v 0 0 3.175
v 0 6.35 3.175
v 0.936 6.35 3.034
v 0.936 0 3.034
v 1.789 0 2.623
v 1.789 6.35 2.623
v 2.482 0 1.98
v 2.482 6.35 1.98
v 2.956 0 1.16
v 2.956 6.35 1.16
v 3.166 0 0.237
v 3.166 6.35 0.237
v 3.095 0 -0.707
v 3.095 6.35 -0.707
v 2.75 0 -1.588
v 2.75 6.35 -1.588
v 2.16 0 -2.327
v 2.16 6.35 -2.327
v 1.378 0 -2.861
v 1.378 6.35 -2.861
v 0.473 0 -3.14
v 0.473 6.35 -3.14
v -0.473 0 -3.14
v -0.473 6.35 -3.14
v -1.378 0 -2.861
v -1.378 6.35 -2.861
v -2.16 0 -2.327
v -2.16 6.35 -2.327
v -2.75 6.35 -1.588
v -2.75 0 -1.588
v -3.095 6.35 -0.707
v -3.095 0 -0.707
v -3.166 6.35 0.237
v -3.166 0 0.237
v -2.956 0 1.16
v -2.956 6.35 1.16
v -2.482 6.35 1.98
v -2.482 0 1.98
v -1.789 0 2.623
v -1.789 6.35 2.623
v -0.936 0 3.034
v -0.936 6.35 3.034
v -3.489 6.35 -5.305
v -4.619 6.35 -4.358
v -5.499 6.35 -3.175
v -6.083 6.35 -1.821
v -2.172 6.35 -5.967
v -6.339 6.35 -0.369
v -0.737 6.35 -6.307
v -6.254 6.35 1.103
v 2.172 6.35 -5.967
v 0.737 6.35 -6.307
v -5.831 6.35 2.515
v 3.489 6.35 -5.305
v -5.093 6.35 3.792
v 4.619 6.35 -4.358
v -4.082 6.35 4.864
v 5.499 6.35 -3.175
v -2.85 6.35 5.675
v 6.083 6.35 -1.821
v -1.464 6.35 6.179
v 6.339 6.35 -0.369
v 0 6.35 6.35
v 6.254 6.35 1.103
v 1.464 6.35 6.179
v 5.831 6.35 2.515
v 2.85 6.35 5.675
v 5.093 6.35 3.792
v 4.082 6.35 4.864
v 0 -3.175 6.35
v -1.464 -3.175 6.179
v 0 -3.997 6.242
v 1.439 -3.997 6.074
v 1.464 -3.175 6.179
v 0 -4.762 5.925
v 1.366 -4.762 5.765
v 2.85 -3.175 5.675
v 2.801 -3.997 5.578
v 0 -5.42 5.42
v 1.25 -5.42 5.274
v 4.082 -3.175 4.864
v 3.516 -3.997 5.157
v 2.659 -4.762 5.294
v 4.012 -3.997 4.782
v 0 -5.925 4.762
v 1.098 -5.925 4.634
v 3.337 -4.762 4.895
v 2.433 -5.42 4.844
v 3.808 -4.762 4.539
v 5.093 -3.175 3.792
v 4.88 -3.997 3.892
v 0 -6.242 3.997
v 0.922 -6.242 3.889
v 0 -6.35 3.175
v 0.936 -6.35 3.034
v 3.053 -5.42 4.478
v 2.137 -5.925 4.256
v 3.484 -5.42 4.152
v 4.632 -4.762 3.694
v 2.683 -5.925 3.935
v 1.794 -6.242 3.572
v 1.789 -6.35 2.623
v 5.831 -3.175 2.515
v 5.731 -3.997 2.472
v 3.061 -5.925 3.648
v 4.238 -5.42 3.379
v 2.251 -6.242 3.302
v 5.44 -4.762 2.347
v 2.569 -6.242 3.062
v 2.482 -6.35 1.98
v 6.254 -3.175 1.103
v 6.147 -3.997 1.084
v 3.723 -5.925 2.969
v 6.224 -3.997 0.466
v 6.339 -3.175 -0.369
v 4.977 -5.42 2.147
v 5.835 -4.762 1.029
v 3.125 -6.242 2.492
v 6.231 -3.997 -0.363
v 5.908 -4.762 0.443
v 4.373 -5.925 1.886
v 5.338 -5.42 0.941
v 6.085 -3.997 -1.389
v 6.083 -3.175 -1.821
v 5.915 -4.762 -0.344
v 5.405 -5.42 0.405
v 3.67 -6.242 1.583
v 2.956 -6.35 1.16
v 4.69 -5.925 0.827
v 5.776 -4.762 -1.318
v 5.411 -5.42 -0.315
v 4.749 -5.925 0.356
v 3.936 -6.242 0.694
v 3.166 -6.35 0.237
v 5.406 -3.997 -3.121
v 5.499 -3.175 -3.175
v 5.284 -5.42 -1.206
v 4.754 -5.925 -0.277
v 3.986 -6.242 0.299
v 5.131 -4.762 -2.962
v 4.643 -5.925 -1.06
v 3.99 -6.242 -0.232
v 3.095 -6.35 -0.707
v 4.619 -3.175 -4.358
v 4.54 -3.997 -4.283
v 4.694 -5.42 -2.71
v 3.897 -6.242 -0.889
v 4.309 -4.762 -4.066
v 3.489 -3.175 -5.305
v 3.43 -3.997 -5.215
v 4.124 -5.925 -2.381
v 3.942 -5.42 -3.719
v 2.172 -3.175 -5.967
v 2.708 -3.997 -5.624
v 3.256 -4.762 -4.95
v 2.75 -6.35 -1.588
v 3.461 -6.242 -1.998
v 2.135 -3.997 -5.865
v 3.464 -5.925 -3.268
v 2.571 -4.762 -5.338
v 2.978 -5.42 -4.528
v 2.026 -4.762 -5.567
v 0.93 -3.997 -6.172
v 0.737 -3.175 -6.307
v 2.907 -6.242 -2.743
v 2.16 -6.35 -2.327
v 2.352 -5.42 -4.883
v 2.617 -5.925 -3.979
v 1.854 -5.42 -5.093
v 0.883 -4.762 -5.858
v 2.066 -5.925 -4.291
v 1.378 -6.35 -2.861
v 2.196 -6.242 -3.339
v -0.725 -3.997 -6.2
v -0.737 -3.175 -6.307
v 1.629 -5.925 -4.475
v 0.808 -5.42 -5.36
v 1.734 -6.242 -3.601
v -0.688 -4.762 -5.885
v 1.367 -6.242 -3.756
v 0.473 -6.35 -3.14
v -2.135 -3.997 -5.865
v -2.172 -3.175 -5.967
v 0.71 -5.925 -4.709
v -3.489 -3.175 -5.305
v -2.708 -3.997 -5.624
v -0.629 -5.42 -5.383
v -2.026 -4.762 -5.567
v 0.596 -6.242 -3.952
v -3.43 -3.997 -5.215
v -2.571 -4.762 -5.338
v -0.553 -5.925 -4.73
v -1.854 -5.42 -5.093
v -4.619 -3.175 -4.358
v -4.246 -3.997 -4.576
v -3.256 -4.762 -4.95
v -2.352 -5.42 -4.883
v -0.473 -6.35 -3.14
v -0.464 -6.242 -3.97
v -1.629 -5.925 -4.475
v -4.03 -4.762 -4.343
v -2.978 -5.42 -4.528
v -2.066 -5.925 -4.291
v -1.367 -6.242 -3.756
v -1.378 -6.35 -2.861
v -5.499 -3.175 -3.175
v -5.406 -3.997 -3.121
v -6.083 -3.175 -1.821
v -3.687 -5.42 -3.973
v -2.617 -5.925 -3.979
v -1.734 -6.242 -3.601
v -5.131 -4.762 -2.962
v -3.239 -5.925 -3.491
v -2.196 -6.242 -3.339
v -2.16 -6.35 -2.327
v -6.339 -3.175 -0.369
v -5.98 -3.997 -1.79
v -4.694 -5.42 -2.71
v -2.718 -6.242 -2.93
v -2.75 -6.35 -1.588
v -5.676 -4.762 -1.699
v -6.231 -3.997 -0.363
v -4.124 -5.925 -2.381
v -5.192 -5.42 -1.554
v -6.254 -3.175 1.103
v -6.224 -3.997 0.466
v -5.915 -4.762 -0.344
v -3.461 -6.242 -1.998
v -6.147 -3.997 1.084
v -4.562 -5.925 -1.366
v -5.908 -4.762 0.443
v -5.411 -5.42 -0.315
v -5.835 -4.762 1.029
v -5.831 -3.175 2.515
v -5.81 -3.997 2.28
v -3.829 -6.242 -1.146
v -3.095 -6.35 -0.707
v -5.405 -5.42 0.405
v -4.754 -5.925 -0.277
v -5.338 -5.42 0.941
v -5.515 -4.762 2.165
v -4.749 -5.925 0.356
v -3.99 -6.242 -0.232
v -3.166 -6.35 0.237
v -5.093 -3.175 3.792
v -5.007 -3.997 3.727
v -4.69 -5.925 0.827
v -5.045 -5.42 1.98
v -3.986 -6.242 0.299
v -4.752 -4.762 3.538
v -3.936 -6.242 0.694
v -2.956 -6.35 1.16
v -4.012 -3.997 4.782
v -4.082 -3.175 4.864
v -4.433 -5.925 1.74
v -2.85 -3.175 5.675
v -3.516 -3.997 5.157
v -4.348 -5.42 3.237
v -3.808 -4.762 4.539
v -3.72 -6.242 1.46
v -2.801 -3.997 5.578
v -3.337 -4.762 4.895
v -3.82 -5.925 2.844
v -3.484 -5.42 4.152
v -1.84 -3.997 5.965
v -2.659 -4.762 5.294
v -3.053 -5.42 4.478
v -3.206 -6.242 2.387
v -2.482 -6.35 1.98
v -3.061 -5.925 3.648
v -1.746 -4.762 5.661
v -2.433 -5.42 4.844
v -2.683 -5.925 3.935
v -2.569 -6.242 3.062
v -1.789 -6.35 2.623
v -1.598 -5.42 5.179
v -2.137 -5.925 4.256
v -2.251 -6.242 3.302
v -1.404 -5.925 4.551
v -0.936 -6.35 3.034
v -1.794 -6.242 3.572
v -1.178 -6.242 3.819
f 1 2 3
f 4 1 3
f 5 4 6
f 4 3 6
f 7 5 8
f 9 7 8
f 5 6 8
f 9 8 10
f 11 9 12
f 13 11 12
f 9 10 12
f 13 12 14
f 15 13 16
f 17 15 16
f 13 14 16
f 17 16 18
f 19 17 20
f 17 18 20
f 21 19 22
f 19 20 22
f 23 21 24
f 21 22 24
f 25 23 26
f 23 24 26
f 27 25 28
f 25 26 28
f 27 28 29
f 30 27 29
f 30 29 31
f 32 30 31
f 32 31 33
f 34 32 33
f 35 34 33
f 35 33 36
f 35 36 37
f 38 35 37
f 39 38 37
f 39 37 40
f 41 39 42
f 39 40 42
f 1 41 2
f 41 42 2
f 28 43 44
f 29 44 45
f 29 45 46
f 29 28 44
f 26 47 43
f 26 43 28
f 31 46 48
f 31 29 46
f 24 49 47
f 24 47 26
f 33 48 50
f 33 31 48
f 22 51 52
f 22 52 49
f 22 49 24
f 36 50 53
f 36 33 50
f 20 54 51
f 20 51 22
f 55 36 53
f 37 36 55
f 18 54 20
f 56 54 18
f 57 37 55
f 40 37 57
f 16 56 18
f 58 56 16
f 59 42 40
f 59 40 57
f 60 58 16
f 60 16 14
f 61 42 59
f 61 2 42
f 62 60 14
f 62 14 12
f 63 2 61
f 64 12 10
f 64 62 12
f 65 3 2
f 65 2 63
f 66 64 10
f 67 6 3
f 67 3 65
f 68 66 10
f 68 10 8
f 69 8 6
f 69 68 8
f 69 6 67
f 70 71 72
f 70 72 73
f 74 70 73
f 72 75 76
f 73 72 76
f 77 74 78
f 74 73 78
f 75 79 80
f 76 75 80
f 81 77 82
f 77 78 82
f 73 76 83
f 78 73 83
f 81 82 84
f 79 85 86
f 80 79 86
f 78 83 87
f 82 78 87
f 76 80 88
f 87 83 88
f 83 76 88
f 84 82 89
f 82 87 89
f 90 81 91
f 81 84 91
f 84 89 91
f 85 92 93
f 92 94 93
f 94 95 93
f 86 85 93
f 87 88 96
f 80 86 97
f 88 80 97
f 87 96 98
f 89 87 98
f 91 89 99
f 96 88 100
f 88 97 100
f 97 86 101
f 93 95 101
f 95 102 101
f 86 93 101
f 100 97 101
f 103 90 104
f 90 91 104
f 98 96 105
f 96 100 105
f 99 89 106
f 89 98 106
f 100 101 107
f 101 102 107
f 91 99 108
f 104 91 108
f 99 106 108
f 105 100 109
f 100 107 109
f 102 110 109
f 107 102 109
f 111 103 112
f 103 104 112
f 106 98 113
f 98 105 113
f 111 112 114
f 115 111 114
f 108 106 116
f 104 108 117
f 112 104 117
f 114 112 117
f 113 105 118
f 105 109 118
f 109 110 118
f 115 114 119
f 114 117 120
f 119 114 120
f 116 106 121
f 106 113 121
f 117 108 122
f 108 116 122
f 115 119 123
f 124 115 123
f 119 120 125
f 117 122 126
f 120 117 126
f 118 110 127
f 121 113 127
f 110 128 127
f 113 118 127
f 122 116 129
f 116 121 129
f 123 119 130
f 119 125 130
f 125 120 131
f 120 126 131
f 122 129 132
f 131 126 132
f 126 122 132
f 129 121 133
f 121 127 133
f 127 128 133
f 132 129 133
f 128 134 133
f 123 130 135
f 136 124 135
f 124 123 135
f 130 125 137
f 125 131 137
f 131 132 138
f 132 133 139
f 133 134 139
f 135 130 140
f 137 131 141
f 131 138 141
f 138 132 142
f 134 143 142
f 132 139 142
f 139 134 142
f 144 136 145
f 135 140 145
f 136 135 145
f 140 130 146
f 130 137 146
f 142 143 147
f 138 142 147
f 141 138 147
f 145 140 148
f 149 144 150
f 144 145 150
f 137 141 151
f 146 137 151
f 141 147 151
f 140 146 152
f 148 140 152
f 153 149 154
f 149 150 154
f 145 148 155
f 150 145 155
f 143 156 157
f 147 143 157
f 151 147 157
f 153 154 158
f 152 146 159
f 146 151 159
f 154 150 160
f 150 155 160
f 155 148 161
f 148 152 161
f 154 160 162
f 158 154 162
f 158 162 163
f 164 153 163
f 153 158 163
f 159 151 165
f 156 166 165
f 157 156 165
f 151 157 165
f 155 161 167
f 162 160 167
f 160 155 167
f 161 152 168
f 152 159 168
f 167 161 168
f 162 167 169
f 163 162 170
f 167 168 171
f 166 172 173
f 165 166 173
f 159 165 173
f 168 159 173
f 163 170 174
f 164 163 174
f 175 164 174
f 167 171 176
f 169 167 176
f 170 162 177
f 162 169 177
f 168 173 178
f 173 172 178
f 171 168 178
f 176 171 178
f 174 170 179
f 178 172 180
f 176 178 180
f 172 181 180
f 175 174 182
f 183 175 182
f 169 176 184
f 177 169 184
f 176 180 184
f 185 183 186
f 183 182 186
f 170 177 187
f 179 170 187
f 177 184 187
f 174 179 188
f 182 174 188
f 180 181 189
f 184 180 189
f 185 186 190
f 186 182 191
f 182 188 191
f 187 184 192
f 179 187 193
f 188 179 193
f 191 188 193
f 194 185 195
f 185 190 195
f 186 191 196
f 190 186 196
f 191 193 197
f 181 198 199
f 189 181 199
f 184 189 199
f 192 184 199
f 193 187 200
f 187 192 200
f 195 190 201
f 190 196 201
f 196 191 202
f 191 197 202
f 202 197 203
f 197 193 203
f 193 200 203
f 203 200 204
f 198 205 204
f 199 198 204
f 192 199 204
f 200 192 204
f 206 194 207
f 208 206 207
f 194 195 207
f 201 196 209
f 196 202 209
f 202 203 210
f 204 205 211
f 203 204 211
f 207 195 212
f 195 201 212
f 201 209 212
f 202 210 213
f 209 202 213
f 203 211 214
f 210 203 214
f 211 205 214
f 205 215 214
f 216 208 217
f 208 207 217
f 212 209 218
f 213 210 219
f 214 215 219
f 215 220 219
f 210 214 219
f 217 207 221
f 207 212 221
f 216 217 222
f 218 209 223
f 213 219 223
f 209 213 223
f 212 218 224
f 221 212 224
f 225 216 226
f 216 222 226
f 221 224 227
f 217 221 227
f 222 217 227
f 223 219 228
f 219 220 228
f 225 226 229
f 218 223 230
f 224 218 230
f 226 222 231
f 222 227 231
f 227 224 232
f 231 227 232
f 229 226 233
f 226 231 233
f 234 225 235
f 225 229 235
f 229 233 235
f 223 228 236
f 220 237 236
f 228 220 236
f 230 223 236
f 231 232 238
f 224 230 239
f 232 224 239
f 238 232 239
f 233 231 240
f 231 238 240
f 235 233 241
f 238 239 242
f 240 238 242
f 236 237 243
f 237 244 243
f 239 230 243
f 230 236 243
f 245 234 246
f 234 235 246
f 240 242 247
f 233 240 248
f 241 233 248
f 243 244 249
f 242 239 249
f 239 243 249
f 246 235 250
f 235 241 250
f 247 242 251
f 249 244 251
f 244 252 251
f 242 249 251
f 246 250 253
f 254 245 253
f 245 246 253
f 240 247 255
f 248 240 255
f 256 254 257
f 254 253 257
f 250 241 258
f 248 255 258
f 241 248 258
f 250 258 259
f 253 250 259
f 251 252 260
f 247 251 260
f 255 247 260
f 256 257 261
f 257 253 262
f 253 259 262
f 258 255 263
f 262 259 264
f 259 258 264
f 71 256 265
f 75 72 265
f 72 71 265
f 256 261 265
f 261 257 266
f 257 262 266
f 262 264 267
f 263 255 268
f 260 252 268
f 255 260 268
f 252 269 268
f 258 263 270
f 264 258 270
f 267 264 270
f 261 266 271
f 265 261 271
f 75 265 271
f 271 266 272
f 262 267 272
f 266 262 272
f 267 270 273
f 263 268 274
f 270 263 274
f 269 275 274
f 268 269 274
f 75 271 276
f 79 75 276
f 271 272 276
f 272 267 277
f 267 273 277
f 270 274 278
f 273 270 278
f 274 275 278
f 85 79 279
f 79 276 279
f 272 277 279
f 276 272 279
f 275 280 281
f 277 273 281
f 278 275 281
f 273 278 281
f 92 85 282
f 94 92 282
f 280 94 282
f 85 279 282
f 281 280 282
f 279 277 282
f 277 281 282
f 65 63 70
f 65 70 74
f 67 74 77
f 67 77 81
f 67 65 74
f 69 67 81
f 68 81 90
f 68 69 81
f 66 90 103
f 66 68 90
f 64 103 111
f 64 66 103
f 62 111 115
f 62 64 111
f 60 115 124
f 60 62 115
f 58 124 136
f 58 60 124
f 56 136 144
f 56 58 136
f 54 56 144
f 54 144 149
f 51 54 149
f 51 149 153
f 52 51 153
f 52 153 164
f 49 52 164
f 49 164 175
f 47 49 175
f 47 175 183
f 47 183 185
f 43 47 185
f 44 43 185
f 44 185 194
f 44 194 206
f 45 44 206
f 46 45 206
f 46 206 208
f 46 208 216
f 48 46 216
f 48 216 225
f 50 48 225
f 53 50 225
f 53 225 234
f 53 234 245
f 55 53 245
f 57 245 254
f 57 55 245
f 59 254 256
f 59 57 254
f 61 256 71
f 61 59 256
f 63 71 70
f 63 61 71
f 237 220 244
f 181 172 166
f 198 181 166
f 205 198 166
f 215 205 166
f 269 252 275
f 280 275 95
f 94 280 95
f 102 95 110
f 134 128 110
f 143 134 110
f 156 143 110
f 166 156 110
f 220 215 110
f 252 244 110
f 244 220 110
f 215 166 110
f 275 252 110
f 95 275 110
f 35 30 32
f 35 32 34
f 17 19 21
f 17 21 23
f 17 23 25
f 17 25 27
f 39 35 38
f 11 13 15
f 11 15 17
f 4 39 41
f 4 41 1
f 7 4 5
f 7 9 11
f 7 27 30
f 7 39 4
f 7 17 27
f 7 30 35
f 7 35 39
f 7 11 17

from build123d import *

# Parameters (mm, degrees)
SKETCH1_R           = 6.35
BOSS_EXTRUDE1_DEPTH = 6.35
SKETCH2_R           = 3.175
CUT_EXTRUDE1_DEPTH  = 6.35
FILLET1_R           = 3.175


with BuildPart() as part:
    # Sketch1 → Boss-Extrude1 (new, symmetric)
    with BuildSketch(Plane(origin=(0, 0, 0), x_dir=(1, 0, 0), z_dir=(0, 1, 0))):
        with Locations(Location((0, 0, 0), (0, 0, 270))):
            Circle(SKETCH1_R)
    extrude(amount=BOSS_EXTRUDE1_DEPTH, both=True)

    # Sketch2 → Cut-Extrude1 (cut)
    with BuildSketch(Plane(origin=(0, 6.35, 0), x_dir=(1, 0, 0), z_dir=(0, 1, 0))):
        with Locations(Location((0, 0, 0), (0, 0, 270))):
            Circle(SKETCH2_R)
    extrude(amount=-CUT_EXTRUDE1_DEPTH, mode=Mode.SUBTRACT)

    # Fillet1
    fillet1_edges = [part.edges().sort_by_distance(p)[0] for p in [
        (0, -6.35, -6.35),
    ]]
    fillet(fillet1_edges, radius=FILLET1_R)


solid = part.part
